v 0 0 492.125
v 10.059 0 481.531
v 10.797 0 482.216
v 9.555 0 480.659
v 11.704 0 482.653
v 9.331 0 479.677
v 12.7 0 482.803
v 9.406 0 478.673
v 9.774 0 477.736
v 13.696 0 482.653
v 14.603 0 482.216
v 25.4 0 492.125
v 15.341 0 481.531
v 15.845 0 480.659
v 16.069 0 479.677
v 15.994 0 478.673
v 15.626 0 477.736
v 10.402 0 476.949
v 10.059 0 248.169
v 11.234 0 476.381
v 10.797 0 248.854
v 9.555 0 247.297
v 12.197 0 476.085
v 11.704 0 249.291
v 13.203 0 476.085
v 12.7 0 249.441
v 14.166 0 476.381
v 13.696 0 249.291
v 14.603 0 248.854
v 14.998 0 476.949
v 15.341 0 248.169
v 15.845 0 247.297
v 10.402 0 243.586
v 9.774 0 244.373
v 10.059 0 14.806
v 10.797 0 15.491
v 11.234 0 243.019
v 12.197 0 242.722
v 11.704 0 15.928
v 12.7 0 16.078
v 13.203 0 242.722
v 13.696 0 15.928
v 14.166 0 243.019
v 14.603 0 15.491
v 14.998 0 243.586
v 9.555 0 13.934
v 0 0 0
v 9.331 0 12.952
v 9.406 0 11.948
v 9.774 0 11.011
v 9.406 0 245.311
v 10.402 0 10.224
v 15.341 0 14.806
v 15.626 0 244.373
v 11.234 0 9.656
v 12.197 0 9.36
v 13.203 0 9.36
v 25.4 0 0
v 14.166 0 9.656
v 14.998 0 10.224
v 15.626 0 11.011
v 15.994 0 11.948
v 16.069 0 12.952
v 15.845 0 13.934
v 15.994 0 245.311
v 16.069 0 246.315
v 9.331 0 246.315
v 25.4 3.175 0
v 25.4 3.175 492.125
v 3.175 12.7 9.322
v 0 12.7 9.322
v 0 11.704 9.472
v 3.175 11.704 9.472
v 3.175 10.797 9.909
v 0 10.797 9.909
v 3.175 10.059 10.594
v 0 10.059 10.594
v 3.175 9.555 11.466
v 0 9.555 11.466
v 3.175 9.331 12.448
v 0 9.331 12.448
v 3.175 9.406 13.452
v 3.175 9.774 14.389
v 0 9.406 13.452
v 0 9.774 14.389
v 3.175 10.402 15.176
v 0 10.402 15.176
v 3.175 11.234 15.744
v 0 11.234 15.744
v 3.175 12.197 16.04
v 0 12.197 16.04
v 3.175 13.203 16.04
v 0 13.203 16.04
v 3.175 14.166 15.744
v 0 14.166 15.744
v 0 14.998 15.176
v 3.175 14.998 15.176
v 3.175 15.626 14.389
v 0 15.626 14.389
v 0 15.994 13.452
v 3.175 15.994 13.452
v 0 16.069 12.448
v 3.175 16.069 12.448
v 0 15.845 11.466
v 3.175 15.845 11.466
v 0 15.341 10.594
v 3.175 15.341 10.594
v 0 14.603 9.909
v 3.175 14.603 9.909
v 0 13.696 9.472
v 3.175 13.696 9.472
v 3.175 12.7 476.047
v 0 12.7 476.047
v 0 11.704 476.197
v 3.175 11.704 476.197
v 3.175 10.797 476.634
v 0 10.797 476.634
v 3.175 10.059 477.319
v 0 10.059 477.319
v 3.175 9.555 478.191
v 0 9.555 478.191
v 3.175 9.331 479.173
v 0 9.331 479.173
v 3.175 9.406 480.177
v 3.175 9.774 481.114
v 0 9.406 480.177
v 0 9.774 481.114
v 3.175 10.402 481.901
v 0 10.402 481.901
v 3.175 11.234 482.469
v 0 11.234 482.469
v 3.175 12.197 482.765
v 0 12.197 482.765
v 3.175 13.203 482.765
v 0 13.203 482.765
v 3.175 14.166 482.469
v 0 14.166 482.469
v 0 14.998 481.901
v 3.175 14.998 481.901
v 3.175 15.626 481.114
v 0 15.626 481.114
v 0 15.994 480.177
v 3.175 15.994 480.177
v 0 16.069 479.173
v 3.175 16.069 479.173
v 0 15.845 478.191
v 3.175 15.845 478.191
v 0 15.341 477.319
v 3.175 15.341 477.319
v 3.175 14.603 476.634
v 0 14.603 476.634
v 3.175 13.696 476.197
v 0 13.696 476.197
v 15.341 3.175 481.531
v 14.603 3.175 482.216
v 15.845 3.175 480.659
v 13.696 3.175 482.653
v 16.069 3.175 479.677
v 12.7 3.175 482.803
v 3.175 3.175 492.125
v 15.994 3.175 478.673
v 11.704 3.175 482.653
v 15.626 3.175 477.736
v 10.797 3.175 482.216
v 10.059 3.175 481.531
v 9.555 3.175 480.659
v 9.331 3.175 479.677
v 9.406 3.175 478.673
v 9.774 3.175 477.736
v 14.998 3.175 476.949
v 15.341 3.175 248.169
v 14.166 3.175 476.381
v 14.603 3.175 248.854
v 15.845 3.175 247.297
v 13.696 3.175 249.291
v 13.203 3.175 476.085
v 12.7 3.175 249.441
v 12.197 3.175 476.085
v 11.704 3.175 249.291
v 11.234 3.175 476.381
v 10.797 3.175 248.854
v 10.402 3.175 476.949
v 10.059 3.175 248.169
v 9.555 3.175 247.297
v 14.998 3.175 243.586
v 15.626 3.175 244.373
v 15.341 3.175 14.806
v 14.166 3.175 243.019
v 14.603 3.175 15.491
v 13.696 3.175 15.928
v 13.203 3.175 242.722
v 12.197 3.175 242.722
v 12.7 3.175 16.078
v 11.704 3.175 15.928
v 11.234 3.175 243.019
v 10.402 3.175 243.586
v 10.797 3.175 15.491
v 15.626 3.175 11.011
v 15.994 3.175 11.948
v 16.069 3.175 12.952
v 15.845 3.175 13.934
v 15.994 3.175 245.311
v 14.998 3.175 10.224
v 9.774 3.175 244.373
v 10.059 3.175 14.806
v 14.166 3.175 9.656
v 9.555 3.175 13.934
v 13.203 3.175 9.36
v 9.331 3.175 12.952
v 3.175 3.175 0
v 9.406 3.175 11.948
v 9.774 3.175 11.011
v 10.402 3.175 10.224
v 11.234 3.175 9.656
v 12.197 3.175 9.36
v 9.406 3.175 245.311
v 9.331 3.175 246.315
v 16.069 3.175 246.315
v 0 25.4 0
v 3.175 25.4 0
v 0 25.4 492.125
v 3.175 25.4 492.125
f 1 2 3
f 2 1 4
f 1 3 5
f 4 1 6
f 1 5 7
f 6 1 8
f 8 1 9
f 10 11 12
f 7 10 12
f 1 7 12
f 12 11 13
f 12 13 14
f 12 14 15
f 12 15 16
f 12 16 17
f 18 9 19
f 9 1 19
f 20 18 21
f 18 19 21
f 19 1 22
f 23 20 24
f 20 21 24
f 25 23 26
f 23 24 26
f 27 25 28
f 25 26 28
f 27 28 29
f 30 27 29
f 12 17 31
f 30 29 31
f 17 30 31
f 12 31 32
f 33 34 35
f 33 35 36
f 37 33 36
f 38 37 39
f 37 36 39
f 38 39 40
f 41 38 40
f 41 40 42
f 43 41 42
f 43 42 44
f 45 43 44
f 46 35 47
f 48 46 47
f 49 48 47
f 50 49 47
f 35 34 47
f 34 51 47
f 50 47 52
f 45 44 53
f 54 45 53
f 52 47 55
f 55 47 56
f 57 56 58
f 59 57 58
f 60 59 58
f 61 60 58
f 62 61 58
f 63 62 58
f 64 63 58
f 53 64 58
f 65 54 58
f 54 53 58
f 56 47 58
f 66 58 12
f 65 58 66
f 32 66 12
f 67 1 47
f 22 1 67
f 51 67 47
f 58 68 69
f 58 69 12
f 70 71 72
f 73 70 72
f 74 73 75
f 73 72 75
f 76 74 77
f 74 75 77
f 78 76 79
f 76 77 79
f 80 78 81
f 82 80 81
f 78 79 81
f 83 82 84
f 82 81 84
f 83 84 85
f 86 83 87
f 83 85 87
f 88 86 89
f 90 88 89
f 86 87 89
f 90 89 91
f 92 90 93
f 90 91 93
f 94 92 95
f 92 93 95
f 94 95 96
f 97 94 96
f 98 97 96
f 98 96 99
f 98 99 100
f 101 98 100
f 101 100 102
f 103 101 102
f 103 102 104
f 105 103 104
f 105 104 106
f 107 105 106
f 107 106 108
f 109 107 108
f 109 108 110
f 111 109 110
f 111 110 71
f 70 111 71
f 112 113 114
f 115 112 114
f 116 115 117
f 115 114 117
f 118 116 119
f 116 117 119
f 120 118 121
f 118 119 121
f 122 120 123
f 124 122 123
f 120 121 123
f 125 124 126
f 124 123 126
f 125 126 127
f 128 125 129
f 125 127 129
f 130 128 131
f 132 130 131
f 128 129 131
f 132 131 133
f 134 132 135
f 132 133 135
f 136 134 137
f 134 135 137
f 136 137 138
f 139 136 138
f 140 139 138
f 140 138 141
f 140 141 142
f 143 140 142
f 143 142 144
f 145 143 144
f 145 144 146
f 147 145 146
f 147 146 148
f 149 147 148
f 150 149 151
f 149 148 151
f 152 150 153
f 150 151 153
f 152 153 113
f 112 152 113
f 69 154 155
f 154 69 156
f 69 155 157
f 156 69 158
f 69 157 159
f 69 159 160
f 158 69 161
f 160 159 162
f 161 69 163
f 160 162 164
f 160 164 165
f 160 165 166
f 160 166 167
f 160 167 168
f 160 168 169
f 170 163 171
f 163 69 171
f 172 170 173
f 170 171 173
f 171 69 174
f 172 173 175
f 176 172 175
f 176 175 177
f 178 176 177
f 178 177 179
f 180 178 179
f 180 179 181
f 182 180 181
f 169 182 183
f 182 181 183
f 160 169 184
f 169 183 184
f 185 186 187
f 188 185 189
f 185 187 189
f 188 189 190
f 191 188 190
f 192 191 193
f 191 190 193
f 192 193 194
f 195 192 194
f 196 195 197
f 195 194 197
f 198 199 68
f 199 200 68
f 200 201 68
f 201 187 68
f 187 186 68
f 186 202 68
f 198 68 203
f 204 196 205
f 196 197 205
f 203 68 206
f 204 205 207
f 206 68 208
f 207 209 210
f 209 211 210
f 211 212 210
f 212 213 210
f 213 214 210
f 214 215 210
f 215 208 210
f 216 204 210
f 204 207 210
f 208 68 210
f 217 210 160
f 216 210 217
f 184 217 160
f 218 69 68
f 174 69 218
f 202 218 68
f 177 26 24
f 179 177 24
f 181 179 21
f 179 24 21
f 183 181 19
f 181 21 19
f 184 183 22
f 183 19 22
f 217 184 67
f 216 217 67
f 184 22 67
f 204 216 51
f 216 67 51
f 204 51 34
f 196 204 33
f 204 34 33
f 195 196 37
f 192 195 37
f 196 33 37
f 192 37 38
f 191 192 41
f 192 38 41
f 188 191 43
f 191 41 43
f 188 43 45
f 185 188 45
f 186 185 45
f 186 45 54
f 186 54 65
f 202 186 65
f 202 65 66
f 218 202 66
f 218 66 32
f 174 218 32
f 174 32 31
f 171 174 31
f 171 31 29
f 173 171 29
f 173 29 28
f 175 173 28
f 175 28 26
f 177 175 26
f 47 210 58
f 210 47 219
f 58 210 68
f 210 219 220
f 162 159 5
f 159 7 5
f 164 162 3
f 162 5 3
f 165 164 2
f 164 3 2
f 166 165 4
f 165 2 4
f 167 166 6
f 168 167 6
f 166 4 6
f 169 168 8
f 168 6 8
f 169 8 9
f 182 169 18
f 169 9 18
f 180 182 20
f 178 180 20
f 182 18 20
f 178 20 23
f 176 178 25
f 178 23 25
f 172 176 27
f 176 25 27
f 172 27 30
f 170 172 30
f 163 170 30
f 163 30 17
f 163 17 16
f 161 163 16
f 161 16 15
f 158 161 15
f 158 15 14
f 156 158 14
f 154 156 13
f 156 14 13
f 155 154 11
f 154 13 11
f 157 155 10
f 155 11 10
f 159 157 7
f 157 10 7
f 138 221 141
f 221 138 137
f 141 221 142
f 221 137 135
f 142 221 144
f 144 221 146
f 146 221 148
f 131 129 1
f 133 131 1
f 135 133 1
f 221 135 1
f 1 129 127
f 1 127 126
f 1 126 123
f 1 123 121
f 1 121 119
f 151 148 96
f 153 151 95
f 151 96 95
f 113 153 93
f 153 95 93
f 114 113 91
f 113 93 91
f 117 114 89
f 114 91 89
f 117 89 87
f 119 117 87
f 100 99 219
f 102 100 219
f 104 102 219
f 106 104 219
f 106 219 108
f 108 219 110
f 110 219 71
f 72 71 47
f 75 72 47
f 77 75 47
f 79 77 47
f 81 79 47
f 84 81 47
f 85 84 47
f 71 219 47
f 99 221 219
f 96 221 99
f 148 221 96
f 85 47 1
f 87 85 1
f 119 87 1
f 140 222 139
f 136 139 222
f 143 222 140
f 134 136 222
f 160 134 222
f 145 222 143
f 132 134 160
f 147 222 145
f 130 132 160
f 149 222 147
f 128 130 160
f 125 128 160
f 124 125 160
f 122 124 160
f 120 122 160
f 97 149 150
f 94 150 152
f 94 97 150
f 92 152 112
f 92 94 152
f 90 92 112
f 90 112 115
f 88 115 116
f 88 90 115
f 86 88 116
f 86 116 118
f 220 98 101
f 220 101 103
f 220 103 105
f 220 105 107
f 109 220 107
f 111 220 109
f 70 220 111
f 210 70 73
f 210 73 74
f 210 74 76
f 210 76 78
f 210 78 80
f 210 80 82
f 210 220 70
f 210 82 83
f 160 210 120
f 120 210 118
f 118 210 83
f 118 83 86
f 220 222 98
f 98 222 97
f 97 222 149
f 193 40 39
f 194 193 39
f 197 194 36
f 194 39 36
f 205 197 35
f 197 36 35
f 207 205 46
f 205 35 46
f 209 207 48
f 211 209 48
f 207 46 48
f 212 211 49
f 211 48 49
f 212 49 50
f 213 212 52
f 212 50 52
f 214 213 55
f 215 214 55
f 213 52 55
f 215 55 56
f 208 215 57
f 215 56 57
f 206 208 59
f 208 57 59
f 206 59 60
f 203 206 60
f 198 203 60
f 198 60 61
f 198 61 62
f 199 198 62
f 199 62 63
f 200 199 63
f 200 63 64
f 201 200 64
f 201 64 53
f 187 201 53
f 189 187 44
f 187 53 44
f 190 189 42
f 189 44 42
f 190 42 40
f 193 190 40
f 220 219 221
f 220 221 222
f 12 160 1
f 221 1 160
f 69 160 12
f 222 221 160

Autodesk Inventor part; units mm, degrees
ref_plane "YZ Plane" through (0, 0, 0) normal (1, 0, 0) x (0, 1, 0)
ref_plane "XZ Plane" through (0, 0, 0) normal (0, 1, 0) x (-1, 0, 0)
ref_plane "XY Plane" through (0, 0, 0) normal (0, 0, 1) x (1, 0, 0)
sketch "Sketch1" plane through (0, 0, 0) normal (0, 0, 1) x (1, 0, 0)
  line L0 (0, 25.4) -> (0, 0)
  line L1 (0, 0) -> (25.4, 0)
  line L2 (3.175, 25.4) -> (3.175, 4.953)
  line L3 (4.953, 3.175) -> (25.4, 3.175)
  line L4 (0, 25.4) -> (3.175, 25.4)
  line L5 (25.4, 3.175) -> (25.4, 0)
  line L6 (3.175, 4.953) -> (3.175, 3.175)
  line L7 (4.953, 3.175) -> (3.175, 3.175)
  dimension "d0" = 25.4
  dimension "d1" = 25.4
  dimension "d2" = 3.175
extrude "Extrusion1" add sketch "Sketch1" along normal blind 492.125
sketch "Sketch2" plane through (3.175, 3.175, 0) normal (0, 1, 0) x (1, 0, 0)
  circle A0 centre (9.525, -479.425) radius 2.8398
  line L0 (22.225, -492.125) -> (0, -492.125) projected
  line L1 (22.225, 0) -> (22.225, -492.125) projected
  circle A1 centre (9.525, -12.7) radius 2.8398
  line L2 (22.225, 0) -> (0, 0) projected
  point P0 (-3.175, 0)
  point P1 (1.778, -492.125)
  point P2 (1.778, 0)
  dimension "d5" = 12.7
  dimension "d6" = 12.7
  dimension "d9" = 466.725
  dimension "d31" = 12.7
hole "rail" at (12.7, 3.175, 479.425) at (12.7, 3.175, 12.7) direction (0, -1, 0) diameter 6.7564 depth 25.4 tip angle 118 clearance for "Flat Head Machine Screw (82)" size "1/4" standard "Ansi Unified Screw Threads"
sketch "Sketch7" plane through (3.175, 3.175, 0) normal (1, 0, 0) x (0, 0, -1)
  circle A0 centre (-479.425, 9.525) radius 2.8124
  line L0 (0, 22.225) -> (-492.125, 22.225) projected
  line L1 (-492.125, 0) -> (-492.125, 22.225) projected
  circle A1 centre (-12.7, 9.525) radius 2.8124
  point P0 (0, -3.175)
  dimension "d43" = 12.7
  dimension "d44" = 12.7
  dimension "d47" = 466.725
hole "mount" at (3.175, 12.7, 479.425) at (3.175, 12.7, 12.7) direction (-1, 0, 0) diameter 6.7564 depth 25.4 tip angle 118 clearance for "Flat Head Machine Screw (82)" size "1/4" standard "Ansi Unified Screw Threads"
sketch "Sketch8" plane through (3.175, 3.175, 0) normal (0, 1, 0) x (1, 0, 0)
  circle A0 centre (9.525, -479.425) radius 3.3782 projected
  circle A1 centre (9.525, -12.7) radius 3.3782 projected
  line L0 (9.525, -479.425) -> (9.525, -12.7) construction
  circle A2 centre (9.525, -246.0625) radius 3.3782
  point P0 (-3.175, 0)
hole "Hole5" at (12.7, 3.175, 246.0625) direction (0, -1, 0) diameter 6.7564 depth 25.4 tip angle 118 clearance for "Flat Head Machine Screw (82)" size "1/4" standard "Ansi Unified Screw Threads"
properties part number "angle_L11"
